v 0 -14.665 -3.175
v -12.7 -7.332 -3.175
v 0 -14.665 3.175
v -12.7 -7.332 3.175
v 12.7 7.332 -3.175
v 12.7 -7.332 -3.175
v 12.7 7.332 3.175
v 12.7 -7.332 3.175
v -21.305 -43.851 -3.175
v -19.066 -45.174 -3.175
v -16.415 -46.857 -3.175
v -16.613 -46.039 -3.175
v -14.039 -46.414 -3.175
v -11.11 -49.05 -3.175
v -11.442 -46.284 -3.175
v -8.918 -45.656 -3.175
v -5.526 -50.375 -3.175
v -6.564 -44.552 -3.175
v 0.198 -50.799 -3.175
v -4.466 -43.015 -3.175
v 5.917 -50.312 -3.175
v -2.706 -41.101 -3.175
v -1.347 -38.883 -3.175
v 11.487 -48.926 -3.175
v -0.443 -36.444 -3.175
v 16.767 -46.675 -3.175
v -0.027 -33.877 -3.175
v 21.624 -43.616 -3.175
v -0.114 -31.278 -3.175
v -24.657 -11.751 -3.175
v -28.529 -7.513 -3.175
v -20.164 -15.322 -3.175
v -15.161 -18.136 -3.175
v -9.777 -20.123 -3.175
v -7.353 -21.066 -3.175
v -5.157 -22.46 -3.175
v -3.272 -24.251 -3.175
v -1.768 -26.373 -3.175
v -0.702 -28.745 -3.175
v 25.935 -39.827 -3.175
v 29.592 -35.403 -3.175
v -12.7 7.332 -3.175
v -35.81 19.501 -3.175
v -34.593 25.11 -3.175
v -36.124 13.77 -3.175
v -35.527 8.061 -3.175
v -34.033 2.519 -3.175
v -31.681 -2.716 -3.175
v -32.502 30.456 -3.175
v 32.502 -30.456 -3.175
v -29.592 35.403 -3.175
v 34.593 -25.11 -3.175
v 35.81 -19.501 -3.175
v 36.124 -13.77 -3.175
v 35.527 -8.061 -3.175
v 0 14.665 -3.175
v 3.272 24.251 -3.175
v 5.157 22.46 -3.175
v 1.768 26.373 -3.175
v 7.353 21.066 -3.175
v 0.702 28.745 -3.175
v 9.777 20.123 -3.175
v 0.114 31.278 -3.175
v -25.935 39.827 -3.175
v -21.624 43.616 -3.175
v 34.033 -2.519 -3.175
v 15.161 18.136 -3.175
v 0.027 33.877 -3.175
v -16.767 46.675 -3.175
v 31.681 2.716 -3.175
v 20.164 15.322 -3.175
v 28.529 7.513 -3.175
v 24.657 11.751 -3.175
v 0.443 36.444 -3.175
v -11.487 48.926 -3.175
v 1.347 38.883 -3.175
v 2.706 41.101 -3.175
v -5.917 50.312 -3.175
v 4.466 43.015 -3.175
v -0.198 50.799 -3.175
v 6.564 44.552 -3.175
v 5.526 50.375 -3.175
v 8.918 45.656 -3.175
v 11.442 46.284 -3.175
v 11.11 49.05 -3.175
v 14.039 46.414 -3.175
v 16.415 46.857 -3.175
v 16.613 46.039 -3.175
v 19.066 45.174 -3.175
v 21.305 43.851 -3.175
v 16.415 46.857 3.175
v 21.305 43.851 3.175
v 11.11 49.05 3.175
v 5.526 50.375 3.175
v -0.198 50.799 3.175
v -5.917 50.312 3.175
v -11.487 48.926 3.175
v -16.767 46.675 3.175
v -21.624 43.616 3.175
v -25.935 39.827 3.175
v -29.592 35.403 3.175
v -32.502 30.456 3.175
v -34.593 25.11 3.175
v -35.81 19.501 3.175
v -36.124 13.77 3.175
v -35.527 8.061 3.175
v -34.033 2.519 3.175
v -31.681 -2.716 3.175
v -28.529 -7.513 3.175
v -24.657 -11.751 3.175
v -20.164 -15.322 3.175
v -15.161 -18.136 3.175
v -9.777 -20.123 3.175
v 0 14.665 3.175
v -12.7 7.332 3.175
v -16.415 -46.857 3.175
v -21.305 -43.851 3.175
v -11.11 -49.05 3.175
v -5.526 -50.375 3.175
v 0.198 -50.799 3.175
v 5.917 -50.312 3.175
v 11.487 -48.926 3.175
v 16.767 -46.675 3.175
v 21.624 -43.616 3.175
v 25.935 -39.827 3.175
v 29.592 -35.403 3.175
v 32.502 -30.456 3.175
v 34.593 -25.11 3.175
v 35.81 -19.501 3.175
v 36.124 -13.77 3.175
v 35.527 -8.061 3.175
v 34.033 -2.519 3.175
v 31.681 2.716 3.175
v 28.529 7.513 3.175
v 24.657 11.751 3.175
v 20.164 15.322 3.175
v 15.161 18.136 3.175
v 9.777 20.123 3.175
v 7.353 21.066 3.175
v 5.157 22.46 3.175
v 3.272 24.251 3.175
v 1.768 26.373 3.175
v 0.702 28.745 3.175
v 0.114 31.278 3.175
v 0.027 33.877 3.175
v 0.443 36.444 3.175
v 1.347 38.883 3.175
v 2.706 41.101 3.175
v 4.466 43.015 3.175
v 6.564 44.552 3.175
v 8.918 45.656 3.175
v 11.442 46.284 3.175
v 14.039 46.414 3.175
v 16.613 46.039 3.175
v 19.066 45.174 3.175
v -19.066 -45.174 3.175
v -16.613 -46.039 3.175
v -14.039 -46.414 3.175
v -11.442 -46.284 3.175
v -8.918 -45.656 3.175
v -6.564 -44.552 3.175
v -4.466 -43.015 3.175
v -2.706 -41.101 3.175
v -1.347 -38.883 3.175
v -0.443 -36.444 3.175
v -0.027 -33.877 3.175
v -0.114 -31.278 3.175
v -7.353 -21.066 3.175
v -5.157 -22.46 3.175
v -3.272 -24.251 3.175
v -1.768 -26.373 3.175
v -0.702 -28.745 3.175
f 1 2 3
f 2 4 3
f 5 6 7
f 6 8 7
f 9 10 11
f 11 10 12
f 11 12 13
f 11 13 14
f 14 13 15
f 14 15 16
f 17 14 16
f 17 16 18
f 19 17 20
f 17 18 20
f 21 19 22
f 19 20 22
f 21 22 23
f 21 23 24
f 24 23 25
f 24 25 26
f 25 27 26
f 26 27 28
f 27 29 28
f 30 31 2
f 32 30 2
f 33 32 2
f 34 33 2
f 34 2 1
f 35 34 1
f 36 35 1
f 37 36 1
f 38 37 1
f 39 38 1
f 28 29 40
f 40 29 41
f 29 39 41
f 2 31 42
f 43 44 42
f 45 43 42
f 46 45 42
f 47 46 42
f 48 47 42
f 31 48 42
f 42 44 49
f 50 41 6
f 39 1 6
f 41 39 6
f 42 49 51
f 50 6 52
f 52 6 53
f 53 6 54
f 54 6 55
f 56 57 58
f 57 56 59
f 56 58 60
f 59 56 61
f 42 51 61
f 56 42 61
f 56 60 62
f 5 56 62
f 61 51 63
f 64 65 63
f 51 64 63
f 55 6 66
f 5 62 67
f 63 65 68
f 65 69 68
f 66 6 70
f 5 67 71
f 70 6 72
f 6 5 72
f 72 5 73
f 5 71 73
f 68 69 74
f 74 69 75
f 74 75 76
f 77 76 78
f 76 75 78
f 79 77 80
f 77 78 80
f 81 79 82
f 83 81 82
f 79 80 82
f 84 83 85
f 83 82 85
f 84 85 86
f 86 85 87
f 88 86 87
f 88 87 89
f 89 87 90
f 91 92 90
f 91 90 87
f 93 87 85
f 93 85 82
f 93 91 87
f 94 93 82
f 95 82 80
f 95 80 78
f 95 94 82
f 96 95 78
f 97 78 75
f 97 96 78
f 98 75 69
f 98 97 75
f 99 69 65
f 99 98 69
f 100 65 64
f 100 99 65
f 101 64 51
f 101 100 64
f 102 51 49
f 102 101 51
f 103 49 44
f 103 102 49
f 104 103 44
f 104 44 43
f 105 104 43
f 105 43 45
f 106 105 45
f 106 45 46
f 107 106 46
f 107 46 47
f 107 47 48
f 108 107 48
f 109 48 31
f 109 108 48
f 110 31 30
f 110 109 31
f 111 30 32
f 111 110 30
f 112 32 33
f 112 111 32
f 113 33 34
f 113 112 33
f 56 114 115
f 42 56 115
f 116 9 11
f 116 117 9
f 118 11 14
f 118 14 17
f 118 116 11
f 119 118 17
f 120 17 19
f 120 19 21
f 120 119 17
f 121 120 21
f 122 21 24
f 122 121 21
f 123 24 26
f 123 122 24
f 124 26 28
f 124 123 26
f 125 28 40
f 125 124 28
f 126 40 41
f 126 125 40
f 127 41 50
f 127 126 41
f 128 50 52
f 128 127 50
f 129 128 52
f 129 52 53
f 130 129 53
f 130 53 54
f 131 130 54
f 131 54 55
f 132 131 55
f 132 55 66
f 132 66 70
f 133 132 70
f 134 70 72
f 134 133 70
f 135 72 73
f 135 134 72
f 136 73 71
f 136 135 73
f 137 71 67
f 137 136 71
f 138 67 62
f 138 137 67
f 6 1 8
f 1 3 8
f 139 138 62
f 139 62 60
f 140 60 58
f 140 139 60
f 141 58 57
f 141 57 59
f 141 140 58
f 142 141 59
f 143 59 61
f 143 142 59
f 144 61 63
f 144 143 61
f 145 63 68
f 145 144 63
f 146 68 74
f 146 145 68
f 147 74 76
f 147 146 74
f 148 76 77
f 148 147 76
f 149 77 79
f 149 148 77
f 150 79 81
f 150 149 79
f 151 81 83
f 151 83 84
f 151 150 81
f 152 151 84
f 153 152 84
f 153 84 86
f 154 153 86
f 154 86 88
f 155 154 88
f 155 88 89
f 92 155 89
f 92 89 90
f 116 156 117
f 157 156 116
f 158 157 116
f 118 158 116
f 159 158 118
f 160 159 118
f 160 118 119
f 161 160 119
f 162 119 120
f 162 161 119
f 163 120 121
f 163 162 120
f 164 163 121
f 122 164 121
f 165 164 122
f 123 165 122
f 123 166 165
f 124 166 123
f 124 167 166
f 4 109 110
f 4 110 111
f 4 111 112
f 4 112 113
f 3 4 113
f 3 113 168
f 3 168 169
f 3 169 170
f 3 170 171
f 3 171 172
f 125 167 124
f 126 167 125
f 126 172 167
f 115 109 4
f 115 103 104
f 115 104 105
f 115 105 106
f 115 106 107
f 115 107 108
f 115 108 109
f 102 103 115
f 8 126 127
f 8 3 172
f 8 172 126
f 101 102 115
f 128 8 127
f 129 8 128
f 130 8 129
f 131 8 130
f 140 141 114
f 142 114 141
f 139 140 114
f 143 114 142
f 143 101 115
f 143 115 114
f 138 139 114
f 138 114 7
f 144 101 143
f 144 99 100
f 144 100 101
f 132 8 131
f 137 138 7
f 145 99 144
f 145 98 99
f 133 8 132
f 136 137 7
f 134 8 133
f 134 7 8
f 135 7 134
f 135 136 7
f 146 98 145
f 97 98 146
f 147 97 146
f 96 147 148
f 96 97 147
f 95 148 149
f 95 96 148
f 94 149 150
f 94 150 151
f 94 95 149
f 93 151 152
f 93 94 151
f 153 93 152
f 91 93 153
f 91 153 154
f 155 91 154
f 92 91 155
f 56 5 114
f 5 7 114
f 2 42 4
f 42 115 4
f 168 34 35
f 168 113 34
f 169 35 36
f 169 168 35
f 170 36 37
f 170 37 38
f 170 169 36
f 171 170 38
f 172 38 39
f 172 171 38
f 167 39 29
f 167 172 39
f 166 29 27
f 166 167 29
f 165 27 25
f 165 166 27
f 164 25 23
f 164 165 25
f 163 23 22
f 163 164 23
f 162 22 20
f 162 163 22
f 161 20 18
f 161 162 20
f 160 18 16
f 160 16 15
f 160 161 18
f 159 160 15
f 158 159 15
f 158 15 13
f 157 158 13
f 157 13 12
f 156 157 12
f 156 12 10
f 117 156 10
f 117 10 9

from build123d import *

# Parameters (mm, degrees)
BOSS_EXTRUDE2_DEPTH = 3.175


with BuildPart() as part:
    # Sketch1 → Boss-Extrude2 (new body, symmetric)
    with BuildSketch(Plane.XY):
        with BuildLine():
            ThreePointArc((-21.30491262, -43.851351885), (32.502343983, -30.45576299), (9.776598146, 20.122919685))
            ThreePointArc((9.776598146, 20.122919685), (1.347485848, 38.882849469), (21.30491262, 43.851351885))
            ThreePointArc((21.30491262, 43.851351885), (-32.502343983, 30.45576299), (-9.776598146, -20.122919685))
            ThreePointArc((-9.776598146, -20.122919685), (-1.347485848, -38.882849469), (-21.30491262, -43.851351885))
        make_face()
        Polygon((0, 14.664696837), (-12.7, 7.332348419), (-12.7, -7.332348419), (0, -14.664696837), (12.7, -7.332348419), (12.7, 7.332348419), align=None, mode=Mode.SUBTRACT)
    extrude(amount=BOSS_EXTRUDE2_DEPTH, both=True)


solid = part.part
